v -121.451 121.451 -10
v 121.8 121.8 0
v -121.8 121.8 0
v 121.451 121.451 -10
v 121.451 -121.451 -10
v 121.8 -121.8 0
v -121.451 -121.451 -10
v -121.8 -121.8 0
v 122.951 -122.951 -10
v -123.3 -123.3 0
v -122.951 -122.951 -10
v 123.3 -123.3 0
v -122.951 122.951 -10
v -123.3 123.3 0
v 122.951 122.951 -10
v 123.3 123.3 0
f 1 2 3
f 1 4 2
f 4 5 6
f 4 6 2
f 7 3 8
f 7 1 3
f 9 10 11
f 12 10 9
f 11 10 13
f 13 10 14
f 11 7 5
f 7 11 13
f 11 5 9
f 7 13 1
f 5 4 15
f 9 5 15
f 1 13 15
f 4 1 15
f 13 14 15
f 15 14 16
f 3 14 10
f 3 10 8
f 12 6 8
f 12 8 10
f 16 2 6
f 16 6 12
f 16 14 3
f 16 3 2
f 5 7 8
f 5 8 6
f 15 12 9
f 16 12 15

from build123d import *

# Parameters (mm, degrees)
SKETCH2_W                    = 246.6
SKETCH2_H                    = 246.6
BOSS_EXTRUDE1_DEPTH          = 10
BOSS_EXTRUDE1_DRAFT          = -2
SKETCH3_W                    = 243.6
SKETCH3_H                    = 243.6
CUT_EXTRUDE1_DEPTH           = 175.659039274
CUT_EXTRUDE1_TAPER           = 2
CUT_EXTRUDE1_OTHER_WAY_DEPTH = 175.659039274


with BuildPart() as part:
    # Sketch2 → Boss-Extrude1 (with draft: the straight prism first)
    with BuildSketch(Plane.XY):
        Rectangle(SKETCH2_W, SKETCH2_H)
    extrude(amount=-BOSS_EXTRUDE1_DEPTH)
    # Boss-Extrude1: the draft: its side faces are tilted about the plane it starts from
    boss_extrude1_sides = [part.faces().sort_by_distance(p)[0] for p in [
        (0, -123.3, -5),
        (123.3, 0, -5),
        (0, 123.3, -5),
        (-123.3, 0, -5),
    ]]
    draft(boss_extrude1_sides, Plane.XY, BOSS_EXTRUDE1_DRAFT)

    # Sketch3 → Cut-Extrude1 (cut)
    with BuildSketch(Plane.XY):
        Rectangle(SKETCH3_W, SKETCH3_H)
    extrude(amount=-CUT_EXTRUDE1_DEPTH, taper=CUT_EXTRUDE1_TAPER, mode=Mode.SUBTRACT)

    # Sketch3 → Cut-Extrude1 other way (cut)
    with BuildSketch(Plane.XY):
        Rectangle(SKETCH3_W, SKETCH3_H)
    extrude(amount=CUT_EXTRUDE1_OTHER_WAY_DEPTH, mode=Mode.SUBTRACT)


solid = part.part
